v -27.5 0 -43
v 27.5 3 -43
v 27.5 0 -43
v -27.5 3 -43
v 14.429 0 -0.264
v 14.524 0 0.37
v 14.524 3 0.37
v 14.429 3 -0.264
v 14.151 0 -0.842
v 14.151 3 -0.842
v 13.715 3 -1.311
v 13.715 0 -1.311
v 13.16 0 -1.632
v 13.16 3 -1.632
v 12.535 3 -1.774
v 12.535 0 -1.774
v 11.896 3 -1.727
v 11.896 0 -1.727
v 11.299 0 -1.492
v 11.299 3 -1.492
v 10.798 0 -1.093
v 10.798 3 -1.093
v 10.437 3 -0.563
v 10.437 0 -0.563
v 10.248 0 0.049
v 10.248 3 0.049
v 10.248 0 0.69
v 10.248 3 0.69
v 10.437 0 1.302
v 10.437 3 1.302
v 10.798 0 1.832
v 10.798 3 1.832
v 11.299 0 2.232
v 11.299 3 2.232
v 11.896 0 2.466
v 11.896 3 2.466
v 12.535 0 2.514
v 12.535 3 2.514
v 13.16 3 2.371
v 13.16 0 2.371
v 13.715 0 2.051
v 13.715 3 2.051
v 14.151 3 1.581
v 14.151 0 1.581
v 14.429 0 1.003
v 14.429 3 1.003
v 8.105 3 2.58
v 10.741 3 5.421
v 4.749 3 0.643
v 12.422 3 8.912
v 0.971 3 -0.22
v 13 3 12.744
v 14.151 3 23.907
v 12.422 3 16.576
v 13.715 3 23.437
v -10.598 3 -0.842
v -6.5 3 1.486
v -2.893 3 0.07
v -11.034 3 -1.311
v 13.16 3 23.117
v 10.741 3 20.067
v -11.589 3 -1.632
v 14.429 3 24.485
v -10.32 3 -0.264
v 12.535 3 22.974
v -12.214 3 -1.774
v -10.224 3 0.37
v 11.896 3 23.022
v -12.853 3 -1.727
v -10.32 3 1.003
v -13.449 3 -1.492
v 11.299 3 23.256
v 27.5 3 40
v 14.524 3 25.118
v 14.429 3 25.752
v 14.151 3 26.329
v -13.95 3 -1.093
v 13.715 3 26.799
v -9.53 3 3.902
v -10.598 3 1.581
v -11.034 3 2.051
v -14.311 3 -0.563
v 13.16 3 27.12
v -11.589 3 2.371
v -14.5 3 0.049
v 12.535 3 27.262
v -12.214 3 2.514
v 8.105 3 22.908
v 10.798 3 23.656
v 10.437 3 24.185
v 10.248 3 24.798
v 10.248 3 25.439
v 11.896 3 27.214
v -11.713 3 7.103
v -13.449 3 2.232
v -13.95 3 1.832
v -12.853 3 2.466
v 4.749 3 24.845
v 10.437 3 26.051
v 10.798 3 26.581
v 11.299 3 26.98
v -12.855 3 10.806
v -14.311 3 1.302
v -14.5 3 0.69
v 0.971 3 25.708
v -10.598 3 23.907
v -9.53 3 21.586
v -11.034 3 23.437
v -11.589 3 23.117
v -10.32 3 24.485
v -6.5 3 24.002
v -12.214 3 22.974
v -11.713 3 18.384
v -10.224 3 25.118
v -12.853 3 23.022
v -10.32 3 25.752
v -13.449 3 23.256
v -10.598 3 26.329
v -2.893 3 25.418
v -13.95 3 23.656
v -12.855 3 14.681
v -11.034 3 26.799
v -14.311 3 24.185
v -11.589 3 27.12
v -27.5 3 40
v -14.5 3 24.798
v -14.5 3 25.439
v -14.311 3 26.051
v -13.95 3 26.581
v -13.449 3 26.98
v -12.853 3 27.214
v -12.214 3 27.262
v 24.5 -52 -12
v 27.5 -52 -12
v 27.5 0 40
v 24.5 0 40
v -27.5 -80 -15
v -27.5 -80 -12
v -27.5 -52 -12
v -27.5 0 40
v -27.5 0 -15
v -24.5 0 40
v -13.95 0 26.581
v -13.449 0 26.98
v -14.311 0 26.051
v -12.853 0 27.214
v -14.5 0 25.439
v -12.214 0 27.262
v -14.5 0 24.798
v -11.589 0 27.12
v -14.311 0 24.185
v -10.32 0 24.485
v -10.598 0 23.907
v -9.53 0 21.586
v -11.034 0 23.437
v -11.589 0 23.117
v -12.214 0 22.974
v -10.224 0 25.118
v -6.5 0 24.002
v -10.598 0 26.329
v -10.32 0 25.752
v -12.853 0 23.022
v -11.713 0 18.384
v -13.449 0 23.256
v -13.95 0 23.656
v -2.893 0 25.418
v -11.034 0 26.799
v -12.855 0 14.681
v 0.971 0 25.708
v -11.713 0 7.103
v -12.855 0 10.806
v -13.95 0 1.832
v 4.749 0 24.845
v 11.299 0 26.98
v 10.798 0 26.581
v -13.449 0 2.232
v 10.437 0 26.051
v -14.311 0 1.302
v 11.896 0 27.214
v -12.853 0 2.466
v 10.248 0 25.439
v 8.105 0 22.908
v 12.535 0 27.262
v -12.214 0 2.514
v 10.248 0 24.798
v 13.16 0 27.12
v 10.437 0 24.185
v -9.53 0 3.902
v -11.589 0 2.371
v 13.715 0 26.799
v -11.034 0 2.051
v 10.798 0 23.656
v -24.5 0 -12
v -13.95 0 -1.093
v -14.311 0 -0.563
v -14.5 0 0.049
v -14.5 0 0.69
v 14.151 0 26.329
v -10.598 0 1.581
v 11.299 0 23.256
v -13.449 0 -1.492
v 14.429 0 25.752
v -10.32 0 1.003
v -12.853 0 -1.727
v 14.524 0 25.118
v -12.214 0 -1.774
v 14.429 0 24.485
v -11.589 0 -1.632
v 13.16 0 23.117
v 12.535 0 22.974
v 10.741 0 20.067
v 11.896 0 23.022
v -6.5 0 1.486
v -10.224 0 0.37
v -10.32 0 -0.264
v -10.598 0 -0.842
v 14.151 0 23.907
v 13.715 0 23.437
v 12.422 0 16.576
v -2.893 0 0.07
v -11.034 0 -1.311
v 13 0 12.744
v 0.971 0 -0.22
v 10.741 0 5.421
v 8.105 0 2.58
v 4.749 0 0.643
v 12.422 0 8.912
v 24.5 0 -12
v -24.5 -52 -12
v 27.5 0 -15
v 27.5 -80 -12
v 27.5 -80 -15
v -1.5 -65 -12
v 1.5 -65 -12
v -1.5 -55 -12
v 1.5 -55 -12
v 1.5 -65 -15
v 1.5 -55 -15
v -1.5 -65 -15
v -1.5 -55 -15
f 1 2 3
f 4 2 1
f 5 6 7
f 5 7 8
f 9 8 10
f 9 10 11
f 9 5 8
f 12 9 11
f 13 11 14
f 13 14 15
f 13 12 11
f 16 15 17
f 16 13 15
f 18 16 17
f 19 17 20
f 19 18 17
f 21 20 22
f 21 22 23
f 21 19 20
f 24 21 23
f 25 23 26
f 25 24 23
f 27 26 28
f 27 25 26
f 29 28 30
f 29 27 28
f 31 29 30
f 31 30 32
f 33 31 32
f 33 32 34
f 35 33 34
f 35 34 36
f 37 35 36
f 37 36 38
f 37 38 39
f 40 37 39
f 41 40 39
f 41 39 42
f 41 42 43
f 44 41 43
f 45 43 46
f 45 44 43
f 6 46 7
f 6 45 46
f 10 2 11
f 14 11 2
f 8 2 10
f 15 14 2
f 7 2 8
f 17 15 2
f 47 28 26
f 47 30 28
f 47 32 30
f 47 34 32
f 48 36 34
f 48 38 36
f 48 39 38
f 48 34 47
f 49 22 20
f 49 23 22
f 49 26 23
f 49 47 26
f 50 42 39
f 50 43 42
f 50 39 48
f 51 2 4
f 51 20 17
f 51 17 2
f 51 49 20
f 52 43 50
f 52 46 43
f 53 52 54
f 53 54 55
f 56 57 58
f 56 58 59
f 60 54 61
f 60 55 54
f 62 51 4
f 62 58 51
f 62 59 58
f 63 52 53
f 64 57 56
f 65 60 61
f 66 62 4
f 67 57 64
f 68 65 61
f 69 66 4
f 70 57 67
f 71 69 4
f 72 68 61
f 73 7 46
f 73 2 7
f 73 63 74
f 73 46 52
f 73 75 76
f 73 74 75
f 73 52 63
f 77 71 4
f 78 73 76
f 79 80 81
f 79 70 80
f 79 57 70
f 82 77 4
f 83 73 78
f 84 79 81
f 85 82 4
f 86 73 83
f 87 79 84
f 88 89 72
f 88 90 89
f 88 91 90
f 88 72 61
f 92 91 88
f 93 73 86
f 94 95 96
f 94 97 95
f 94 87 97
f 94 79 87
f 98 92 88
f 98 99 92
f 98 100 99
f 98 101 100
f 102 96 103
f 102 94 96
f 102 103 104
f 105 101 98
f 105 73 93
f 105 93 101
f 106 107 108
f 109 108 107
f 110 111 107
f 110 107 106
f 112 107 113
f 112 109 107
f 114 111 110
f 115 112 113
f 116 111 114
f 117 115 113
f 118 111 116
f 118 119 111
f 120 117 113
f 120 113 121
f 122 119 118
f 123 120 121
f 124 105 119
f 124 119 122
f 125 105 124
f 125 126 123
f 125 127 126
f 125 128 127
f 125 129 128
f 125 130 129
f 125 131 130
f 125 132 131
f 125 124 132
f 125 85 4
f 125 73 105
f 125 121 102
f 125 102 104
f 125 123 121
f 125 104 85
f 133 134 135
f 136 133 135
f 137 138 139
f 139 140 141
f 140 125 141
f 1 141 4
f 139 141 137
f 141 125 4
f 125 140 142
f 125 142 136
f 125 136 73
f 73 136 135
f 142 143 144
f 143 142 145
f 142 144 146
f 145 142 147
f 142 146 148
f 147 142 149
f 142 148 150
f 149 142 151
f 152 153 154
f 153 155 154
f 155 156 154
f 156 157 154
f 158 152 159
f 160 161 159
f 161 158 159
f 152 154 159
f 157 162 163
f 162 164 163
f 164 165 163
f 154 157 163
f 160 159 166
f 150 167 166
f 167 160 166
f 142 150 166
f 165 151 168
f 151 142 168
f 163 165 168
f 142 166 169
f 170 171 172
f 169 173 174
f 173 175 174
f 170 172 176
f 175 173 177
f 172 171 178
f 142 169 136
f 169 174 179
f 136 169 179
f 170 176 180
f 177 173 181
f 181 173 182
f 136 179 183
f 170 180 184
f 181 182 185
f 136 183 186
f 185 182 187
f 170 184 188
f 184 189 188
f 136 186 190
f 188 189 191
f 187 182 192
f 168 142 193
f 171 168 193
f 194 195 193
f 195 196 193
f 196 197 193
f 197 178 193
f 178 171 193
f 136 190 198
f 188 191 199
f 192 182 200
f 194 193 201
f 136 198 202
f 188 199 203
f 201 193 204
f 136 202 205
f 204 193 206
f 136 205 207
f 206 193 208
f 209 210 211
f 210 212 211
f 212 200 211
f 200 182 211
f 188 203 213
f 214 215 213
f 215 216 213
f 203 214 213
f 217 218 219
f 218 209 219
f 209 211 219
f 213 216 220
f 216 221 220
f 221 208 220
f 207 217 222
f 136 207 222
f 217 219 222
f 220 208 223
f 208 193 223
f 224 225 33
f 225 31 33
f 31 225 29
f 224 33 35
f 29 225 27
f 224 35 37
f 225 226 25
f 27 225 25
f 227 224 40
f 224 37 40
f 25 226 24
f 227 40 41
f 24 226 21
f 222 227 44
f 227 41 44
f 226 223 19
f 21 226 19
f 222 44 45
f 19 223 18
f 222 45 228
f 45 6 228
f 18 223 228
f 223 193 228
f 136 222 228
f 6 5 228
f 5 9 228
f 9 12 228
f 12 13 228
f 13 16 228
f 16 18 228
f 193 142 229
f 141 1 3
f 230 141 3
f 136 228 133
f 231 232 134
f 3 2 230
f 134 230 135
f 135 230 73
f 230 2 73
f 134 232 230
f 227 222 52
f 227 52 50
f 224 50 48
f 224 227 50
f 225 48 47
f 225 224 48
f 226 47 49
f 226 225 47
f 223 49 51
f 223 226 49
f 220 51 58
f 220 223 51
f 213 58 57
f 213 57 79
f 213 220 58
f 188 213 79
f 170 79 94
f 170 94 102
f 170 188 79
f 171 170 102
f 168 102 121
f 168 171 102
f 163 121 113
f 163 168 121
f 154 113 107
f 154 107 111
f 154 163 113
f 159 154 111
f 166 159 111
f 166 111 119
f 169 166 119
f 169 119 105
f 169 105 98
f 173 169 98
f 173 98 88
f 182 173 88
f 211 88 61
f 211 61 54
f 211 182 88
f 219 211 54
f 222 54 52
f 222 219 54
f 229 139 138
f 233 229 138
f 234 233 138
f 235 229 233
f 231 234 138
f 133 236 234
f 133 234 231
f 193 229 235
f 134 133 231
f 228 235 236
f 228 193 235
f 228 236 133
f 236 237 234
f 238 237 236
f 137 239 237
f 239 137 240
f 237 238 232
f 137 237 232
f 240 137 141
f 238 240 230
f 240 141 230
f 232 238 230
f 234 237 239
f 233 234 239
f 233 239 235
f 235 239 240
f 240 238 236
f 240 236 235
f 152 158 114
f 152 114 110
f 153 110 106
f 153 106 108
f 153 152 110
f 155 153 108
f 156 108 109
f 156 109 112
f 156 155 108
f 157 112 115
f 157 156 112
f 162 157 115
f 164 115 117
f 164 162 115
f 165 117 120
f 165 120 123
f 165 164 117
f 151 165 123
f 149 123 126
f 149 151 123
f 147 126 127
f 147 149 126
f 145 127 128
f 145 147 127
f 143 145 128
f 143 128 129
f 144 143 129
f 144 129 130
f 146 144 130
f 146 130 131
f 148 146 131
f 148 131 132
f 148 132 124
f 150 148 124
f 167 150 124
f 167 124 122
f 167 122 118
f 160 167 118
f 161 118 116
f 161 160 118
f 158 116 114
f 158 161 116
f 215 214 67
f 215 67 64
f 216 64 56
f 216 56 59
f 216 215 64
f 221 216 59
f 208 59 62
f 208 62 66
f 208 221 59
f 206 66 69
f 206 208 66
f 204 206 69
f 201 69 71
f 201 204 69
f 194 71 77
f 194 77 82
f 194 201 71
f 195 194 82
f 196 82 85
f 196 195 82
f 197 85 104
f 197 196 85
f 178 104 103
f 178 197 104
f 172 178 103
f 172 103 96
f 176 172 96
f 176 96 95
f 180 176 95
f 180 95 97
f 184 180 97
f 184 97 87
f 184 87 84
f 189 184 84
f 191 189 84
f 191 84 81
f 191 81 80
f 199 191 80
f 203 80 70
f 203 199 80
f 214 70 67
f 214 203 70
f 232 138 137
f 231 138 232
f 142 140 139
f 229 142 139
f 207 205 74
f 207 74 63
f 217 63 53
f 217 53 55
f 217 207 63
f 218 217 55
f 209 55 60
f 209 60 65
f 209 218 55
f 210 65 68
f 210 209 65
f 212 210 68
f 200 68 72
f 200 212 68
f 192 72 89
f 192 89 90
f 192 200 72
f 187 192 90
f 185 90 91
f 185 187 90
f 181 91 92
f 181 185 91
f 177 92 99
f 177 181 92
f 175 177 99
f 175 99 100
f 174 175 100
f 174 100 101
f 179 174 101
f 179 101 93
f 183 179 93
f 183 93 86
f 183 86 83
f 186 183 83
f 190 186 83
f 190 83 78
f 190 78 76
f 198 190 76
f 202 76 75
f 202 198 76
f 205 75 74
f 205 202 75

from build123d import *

# Parameters (mm, degrees)
SKETCH1_W           = 55
SKETCH1_H           = 80
SKETCH1_R           = 13
SKETCH1_R_2         = 2.15
BOSS_EXTRUDE2_DEPTH = 3
SKETCH2_W           = 55
SKETCH2_H           = 3
BOSS_EXTRUDE3_DEPTH = 80
SKETCH3_W           = 3
SKETCH3_H           = 10
CUT_EXTRUDE1_DEPTH  = 80
SKETCH4_W           = 55
SKETCH4_H           = 25
BOSS_EXTRUDE4_DEPTH = 3
SKETCH5_W           = 55
SKETCH5_H           = 3
CUT_EXTRUDE2_DEPTH  = 22
BOSS_EXTRUDE5_DEPTH = 3
BOSS_EXTRUDE6_DEPTH = 3


with BuildPart() as part:
    # Sketch1 → Boss-Extrude2 (new body)
    with BuildSketch(Plane(origin=(0, 0, 0), x_dir=(1, 0, 0), z_dir=(0, 1, 0))):
        Rectangle(SKETCH1_W, SKETCH1_H)
        with Locations((0, -12.743931666)):
            Circle(SKETCH1_R, mode=Mode.SUBTRACT)
        with Locations((12.374368671, -0.369562995)):
            Circle(SKETCH1_R_2, mode=Mode.SUBTRACT)
        with Locations((12.374368671, -25.118300337)):
            Circle(SKETCH1_R_2, mode=Mode.SUBTRACT)
        with Locations((-12.374368671, -25.118300337)):
            Circle(SKETCH1_R_2, mode=Mode.SUBTRACT)
        with Locations((-12.374368671, -0.369562995)):
            Circle(SKETCH1_R_2, mode=Mode.SUBTRACT)
    extrude(amount=BOSS_EXTRUDE2_DEPTH)

    # Sketch2 → Boss-Extrude3 (add)
    with BuildSketch(Plane.XZ):
        with Locations((0, -13.5)):
            Rectangle(SKETCH2_W, SKETCH2_H)
    extrude(amount=BOSS_EXTRUDE3_DEPTH)

    # Sketch3 → Cut-Extrude1 (cut)
    with BuildSketch(Plane(origin=(0, 0, -15), x_dir=(-1, 0, 0), z_dir=(0, 0, -1))):
        with Locations((0, -60)):
            Rectangle(SKETCH3_W, SKETCH3_H)
    extrude(amount=-CUT_EXTRUDE1_DEPTH, mode=Mode.SUBTRACT)

    # Sketch4 → Boss-Extrude4 (add)
    with BuildSketch(Plane(origin=(0, 0, -40), x_dir=(-1, 0, 0), z_dir=(0, 0, -1))):
        with Locations((0, -9.5)):
            Rectangle(SKETCH4_W, SKETCH4_H)
    extrude(amount=BOSS_EXTRUDE4_DEPTH)

    # Sketch5 → Cut-Extrude2 (cut)
    with BuildSketch(Plane.XZ.offset(22)):
        with Locations((0, -41.5)):
            Rectangle(SKETCH5_W, SKETCH5_H)
    extrude(amount=-CUT_EXTRUDE2_DEPTH, mode=Mode.SUBTRACT)

    # Sketch6 → Boss-Extrude5 (add)
    with BuildSketch(Plane(origin=(27.5, 0, 0), x_dir=(0, 0, -1), z_dir=(1, 0, 0))):
        Polygon((-40, 0), (12, 0), (12, -52), align=None)
    extrude(amount=-BOSS_EXTRUDE5_DEPTH)

    # Sketch7 → Boss-Extrude6 (add)
    with BuildSketch(Plane.ZY.offset(27.5)):
        Polygon((-12, 0), (40, 0), (-12, -52), align=None)
    extrude(amount=-BOSS_EXTRUDE6_DEPTH)


solid = part.part
